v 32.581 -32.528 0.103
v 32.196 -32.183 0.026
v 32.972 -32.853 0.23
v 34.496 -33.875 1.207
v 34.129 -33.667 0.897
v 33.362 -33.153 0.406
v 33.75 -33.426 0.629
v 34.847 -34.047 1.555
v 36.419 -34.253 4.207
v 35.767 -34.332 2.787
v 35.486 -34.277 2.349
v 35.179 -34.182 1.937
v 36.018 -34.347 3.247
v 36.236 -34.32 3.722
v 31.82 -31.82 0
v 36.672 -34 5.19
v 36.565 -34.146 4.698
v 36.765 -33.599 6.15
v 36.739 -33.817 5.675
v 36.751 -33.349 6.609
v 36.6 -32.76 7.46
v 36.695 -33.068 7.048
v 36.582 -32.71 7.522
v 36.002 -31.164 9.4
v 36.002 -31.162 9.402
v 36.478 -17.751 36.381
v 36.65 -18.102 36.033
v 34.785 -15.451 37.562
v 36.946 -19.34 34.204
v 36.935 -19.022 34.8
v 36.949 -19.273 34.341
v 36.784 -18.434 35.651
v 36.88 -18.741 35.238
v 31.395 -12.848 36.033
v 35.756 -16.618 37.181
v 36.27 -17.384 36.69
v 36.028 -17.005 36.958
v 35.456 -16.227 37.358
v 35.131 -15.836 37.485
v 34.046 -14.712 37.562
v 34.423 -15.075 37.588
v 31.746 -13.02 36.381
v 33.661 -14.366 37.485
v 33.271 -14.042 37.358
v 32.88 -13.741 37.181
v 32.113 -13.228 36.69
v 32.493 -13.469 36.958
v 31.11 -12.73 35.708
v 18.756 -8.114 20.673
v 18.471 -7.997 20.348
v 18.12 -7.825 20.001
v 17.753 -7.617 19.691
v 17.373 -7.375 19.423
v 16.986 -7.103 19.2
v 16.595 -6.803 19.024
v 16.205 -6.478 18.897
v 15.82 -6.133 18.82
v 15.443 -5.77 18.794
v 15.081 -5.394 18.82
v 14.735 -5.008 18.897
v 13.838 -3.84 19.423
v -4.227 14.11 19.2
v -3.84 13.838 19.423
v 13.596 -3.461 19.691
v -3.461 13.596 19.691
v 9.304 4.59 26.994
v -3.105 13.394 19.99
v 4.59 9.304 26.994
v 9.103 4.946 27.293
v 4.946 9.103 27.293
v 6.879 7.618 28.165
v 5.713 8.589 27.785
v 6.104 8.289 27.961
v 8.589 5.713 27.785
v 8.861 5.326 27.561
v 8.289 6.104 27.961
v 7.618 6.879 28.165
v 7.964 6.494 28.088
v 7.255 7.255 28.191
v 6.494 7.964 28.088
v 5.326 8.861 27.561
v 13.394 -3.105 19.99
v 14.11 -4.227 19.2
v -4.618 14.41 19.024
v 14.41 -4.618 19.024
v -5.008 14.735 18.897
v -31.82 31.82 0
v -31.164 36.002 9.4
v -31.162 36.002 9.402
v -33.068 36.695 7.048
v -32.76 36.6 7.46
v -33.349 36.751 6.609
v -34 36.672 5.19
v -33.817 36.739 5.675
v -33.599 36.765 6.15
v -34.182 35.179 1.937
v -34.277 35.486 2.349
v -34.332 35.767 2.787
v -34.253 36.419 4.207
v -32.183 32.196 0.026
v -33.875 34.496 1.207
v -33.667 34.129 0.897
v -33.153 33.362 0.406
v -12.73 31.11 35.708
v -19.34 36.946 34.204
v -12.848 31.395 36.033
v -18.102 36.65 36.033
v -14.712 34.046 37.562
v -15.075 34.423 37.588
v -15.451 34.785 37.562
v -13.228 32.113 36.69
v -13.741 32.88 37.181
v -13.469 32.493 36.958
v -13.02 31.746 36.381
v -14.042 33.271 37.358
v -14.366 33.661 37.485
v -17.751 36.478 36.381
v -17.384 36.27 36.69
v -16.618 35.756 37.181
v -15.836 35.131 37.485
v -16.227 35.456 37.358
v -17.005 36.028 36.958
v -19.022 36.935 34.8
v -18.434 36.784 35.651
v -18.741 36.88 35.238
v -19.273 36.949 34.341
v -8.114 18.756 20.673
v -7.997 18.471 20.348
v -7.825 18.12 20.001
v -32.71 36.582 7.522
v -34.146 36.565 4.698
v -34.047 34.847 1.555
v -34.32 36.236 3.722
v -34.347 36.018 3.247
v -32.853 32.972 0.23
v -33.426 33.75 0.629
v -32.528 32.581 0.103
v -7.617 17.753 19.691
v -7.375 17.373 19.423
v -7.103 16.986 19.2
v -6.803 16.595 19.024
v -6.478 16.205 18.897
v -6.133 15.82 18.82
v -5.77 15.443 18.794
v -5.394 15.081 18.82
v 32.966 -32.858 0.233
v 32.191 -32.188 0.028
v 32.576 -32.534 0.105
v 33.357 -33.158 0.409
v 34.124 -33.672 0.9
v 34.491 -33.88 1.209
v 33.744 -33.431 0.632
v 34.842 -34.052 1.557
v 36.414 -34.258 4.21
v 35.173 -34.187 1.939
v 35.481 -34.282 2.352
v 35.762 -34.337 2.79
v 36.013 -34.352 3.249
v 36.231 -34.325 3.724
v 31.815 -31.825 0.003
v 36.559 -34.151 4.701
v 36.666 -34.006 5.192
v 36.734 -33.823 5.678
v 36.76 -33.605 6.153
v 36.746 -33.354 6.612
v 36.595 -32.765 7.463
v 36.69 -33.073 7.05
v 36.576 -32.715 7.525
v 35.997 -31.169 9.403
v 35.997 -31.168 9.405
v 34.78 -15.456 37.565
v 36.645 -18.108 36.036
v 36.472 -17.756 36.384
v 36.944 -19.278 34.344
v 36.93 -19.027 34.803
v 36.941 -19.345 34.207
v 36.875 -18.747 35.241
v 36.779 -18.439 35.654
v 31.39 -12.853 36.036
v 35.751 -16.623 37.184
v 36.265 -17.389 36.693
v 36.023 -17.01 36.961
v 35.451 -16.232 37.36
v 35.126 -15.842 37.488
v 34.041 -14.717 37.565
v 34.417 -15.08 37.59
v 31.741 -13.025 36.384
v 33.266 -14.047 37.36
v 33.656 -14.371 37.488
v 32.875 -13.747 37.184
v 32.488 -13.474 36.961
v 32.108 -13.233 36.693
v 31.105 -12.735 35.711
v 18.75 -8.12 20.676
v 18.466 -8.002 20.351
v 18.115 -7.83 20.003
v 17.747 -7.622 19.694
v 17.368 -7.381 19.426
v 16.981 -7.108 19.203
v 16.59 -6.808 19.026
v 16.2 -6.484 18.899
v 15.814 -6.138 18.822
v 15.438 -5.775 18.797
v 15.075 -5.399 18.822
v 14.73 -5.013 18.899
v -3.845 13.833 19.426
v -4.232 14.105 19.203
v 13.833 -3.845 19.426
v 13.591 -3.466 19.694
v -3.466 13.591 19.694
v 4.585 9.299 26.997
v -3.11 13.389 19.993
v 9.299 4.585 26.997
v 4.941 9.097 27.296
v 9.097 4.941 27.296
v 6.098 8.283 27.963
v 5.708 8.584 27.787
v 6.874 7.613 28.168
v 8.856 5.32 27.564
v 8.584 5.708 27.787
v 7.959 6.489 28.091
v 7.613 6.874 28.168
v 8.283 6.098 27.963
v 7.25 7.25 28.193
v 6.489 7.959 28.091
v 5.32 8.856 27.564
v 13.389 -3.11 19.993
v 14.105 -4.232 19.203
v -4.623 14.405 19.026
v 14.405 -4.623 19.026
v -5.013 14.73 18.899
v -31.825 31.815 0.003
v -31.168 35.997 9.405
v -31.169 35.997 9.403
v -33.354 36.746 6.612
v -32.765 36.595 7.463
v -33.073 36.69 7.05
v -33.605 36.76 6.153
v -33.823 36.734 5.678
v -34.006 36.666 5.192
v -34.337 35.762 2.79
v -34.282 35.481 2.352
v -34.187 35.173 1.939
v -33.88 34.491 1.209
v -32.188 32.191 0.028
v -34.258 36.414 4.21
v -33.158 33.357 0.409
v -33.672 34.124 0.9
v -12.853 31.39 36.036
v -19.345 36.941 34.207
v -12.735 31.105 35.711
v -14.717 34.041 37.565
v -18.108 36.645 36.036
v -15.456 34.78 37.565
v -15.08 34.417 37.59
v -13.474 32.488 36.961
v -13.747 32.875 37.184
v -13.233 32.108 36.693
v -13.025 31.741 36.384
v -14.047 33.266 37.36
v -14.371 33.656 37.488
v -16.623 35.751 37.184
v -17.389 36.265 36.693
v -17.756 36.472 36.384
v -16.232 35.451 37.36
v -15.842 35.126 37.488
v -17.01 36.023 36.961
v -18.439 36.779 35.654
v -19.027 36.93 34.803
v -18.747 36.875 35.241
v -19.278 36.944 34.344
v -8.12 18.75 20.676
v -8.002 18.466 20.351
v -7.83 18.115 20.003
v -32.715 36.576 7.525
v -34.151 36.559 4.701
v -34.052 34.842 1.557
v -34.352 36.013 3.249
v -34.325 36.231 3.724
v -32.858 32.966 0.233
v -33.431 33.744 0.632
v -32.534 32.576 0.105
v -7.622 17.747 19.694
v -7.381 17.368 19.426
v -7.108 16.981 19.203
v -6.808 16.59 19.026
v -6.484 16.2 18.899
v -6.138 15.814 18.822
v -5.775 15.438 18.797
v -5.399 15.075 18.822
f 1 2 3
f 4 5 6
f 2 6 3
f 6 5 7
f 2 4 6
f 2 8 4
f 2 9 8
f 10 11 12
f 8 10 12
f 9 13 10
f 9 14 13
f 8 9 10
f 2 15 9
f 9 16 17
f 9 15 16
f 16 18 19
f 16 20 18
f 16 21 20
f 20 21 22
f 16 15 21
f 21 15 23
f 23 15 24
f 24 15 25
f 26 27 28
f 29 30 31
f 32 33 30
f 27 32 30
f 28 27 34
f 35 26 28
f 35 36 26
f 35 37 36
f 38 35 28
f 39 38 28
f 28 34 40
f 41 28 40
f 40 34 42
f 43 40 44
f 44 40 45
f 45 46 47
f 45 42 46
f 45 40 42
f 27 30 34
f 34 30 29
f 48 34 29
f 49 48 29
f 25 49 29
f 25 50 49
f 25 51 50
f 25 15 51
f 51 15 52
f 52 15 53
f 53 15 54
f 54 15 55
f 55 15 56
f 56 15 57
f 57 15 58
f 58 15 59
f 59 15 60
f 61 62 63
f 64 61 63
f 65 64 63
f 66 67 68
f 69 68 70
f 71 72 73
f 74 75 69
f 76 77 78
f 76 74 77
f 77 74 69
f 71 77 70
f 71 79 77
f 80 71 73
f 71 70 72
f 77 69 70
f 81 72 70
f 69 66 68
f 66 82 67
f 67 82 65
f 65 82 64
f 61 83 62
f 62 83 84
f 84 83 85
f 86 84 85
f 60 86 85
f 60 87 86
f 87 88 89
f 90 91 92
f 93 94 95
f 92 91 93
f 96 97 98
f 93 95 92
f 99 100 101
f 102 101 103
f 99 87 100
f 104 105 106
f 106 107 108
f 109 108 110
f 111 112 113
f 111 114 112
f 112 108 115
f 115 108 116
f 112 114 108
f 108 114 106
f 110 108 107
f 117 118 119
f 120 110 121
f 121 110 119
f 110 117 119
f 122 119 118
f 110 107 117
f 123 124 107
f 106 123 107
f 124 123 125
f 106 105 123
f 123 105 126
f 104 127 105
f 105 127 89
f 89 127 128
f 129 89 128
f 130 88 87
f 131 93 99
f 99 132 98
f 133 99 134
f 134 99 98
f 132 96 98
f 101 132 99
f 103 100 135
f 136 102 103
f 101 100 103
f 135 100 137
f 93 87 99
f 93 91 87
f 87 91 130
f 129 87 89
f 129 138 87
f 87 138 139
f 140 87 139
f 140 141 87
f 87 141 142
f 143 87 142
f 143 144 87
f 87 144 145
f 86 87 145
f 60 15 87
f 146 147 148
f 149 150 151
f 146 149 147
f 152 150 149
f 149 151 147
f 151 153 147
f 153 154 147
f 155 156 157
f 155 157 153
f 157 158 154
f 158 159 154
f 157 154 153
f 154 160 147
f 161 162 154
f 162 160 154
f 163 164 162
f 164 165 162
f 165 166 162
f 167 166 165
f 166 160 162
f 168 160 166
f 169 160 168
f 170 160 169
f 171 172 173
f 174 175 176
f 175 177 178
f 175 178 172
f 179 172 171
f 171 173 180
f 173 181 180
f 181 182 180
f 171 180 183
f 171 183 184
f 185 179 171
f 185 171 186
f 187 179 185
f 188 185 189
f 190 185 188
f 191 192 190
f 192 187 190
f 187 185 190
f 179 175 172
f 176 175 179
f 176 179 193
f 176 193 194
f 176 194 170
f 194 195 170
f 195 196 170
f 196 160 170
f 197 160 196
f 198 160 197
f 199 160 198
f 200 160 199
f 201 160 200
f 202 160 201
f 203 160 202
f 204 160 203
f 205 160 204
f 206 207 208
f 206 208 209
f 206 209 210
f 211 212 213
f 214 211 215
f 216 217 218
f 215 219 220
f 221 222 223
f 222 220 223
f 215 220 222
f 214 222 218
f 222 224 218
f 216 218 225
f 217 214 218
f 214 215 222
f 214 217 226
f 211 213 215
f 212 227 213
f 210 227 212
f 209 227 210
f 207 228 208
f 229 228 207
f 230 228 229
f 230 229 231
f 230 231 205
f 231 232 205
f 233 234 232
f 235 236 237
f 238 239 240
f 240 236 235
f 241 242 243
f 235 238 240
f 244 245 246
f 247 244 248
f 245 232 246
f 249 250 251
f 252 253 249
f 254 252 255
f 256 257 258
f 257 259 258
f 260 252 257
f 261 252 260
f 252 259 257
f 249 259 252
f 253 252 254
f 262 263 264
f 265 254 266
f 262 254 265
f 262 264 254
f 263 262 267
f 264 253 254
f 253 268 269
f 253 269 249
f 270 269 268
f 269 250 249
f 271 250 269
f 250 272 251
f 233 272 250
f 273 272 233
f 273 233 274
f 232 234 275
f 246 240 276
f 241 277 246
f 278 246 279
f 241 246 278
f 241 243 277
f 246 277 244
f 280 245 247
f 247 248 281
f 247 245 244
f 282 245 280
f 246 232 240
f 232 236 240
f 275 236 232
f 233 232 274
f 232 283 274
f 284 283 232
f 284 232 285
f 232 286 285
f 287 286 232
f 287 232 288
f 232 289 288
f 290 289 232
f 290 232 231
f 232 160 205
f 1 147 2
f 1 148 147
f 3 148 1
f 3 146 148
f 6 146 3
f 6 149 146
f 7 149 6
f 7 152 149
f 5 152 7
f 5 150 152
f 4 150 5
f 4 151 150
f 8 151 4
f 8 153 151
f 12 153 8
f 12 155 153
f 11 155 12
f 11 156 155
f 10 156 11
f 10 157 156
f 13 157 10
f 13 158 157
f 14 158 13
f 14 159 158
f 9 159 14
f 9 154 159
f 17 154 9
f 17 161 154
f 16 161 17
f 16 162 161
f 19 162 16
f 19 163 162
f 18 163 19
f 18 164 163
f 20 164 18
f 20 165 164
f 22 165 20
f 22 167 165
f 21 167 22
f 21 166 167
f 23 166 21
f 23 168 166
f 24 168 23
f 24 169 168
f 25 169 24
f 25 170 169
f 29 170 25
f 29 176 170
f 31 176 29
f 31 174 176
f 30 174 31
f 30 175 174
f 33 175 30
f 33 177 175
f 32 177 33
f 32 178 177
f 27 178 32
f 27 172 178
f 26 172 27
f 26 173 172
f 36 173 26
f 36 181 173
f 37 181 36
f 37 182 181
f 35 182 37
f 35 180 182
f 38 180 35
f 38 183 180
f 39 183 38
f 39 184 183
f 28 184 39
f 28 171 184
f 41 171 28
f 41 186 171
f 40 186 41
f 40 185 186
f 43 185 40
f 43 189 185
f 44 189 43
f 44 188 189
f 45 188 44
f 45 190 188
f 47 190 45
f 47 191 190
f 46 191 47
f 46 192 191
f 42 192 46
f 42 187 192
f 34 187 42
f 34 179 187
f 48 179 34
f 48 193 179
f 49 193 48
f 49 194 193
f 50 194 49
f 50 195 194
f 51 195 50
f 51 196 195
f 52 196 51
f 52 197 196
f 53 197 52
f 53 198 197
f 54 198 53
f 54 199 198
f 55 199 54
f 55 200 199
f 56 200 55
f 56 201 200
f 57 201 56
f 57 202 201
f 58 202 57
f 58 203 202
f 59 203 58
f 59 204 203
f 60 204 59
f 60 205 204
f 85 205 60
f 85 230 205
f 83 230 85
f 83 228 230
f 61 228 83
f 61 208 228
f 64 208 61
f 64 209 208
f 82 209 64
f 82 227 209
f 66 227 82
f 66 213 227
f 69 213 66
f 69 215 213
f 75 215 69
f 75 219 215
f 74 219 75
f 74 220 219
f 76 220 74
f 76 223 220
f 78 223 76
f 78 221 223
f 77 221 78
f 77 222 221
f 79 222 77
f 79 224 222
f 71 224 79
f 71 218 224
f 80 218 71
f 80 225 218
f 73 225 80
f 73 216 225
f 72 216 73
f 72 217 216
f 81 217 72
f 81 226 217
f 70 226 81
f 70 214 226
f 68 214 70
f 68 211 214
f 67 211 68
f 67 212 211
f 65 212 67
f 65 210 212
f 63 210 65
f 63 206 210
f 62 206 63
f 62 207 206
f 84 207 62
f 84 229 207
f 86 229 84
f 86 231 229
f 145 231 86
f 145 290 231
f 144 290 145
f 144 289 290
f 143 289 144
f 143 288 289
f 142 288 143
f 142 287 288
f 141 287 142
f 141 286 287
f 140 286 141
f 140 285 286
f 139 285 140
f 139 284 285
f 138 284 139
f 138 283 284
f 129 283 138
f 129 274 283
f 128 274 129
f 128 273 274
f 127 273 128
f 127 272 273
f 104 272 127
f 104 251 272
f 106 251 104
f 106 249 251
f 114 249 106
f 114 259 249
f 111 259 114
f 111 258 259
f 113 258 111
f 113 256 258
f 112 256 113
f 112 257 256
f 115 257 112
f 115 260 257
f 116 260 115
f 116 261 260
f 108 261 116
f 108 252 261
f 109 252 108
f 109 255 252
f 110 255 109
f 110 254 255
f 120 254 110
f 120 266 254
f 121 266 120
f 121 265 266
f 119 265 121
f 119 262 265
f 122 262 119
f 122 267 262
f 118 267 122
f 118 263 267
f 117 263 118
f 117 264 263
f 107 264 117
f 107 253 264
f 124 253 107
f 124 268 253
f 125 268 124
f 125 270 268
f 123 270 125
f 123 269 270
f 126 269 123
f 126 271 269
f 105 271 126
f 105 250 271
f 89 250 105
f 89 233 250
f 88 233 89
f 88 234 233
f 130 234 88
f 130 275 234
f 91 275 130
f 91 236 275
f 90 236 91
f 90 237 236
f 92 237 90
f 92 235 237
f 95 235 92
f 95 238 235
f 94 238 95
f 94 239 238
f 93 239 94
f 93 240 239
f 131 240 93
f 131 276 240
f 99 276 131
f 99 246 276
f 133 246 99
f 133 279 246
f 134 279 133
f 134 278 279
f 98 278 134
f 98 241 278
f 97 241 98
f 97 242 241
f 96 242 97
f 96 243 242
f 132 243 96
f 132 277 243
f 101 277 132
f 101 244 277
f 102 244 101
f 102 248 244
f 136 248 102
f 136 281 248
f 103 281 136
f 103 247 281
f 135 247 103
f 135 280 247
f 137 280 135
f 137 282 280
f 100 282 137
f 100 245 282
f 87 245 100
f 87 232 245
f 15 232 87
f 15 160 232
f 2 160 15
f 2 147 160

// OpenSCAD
// file: ../utils/core/clip.scad
//
// NopSCADlib Copyright Chris Palmer 2018
// nop.head@gmail.com
// hydraraptor.blogspot.com
//
// This file is part of NopSCADlib.
//
// NopSCADlib is free software: you can redistribute it and/or modify it under the terms of the
// GNU General Public License as published by the Free Software Foundation, either version 3 of
// the License, or (at your option) any later version.
//
// NopSCADlib is distributed in the hope that it will be useful, but WITHOUT ANY WARRANTY;
// without even the implied warranty of MERCHANTABILITY or FITNESS FOR A PARTICULAR PURPOSE.
// See the GNU General Public License for more details.
//
// You should have received a copy of the GNU General Public License along with NopSCADlib.
// If not, see <https://www.gnu.org/licenses/>.
//

//
//! Construct arbirarily large box to partition 3D space and clip objects, useful for creating cross sections to see the inside when debugging.
//!
//! Original version by Doug Moen on the OpenSCAD forum
//
//
module box(xmin, ymin, zmin, xmax, ymax, zmax) //! Construct a box given its bounds
    polyhedron(
        [[xmin, ymin, zmin],  // 0
         [xmin, ymin, zmax],  // 1
         [xmin, ymax, zmin],  // 2
         [xmin, ymax, zmax],  // 3
         [xmax, ymin, zmin],  // 4
         [xmax, ymin, zmax],  // 5
         [xmax, ymax, zmin],  // 6
         [xmax, ymax, zmax]], // 7
        [[7,5,1,3],  // top
         [2,0,4,6],  // bottom
         [5,4,0,1],  // front
         [3,2,6,7],  // back
         [5,7,6,4],  // right
         [0,2,3,1]]  // left
    );

module clip(xmin = -inf, ymin = -inf, zmin = -inf, xmax = inf, ymax = inf, zmax = inf) //! Clip child to specified boundaries
    render() intersection() {
        children();

        box(xmin, ymin, zmin, xmax, ymax, zmax);
    }
// file: ../utils/core/rounded_rectangle.scad
//
// NopSCADlib Copyright Chris Palmer 2018
// nop.head@gmail.com
// hydraraptor.blogspot.com
//
// This file is part of NopSCADlib.
//
// NopSCADlib is free software: you can redistribute it and/or modify it under the terms of the
// GNU General Public License as published by the Free Software Foundation, either version 3 of
// the License, or (at your option) any later version.
//
// NopSCADlib is distributed in the hope that it will be useful, but WITHOUT ANY WARRANTY;
// without even the implied warranty of MERCHANTABILITY or FITNESS FOR A PARTICULAR PURPOSE.
// See the GNU General Public License for more details.
//
// You should have received a copy of the GNU General Public License along with NopSCADlib.
// If not, see <https://www.gnu.org/licenses/>.
//

//
//! Rectangle with rounded corners.
//
module rounded_square(size, r, center = true) //! Like ```square()``` but with with rounded corners
{
    $fn = r2sides4n(r);
    offset(r) offset(-r) square(size, center = center);
}

module rounded_rectangle(size, r, center = true, xy_center = true) //! Like ```cube()``` but corners rounded in XY plane and separate centre options for xy and z.
{
    linear_extrude(height = size[2], center = center)
        rounded_square([size[0], size[1]], r, xy_center);
}
// file: ../utils/core/teardrops.scad
//
// NopSCADlib Copyright Chris Palmer 2018
// nop.head@gmail.com
// hydraraptor.blogspot.com
//
// This file is part of NopSCADlib.
//
// NopSCADlib is free software: you can redistribute it and/or modify it under the terms of the
// GNU General Public License as published by the Free Software Foundation, either version 3 of
// the License, or (at your option) any later version.
//
// NopSCADlib is distributed in the hope that it will be useful, but WITHOUT ANY WARRANTY;
// without even the implied warranty of MERCHANTABILITY or FITNESS FOR A PARTICULAR PURPOSE.
// See the GNU General Public License for more details.
//
// You should have received a copy of the GNU General Public License along with NopSCADlib.
// If not, see <https://www.gnu.org/licenses/>.
//

//
//! For making horizontal holes that don't need support material.
//! Small holes can get away without it, but they print better with truncated teardrops.
//
module teardrop(h, r, center = true, truncate = true) //! For making horizontal holes that don't need support material, set ```truncate = false``` to make traditional RepRap teardrops that don't even need bridging
    render(convexity = 5)
        extrude_if(h, center)
           hull() {
                circle4n(r);

                if(truncate)
                    translate([0, r / 2])
                        square([2 * r * (sqrt(2) - 1), r], center = true);
                else
                    polygon([[0, 0], [eps, 0], [0, r * sqrt(2)]]);
            }

module teardrop_plus(h, r, center = true, truncate = true) //! Slightly bigger teardrop to allow for the 3D printing staircase effect
    teardrop(h, r + layer_height / 4, center, truncate);

module tearslot(h, r, w, center = true) //! A horizontal slot that doesn't need support material
    extrude_if(h, center)
        hull() {
            translate([-w/2,0,0]) teardrop(r = r, h = 0);
            translate([ w/2,0,0]) teardrop(r = r, h = 0);
        }

module vertical_tearslot(h, r, l, center = true) //! A vertical slot that doesn't need support material
    extrude_if(h, center)
        hull() {
            translate([0,  l / 2]) teardrop(0, r, true);
            translate([0, -l / 2])
                circle4n(r);
        }
// file: ../utils/core/polyholes.scad
//
// NopSCADlib Copyright Chris Palmer 2018
// nop.head@gmail.com
// hydraraptor.blogspot.com
//
// This file is part of NopSCADlib.
//
// NopSCADlib is free software: you can redistribute it and/or modify it under the terms of the
// GNU General Public License as published by the Free Software Foundation, either version 3 of
// the License, or (at your option) any later version.
//
// NopSCADlib is distributed in the hope that it will be useful, but WITHOUT ANY WARRANTY;
// without even the implied warranty of MERCHANTABILITY or FITNESS FOR A PARTICULAR PURPOSE.
// See the GNU General Public License for more details.
//
// You should have received a copy of the GNU General Public License along with NopSCADlib.
// If not, see <https://www.gnu.org/licenses/>.
//

//
//! A method of making 3D printed holes come out the right size regardless of the printer, providing
//! it gets the linear dimensions right. See <https://hydraraptor.blogspot.com/2011/02/polyholes.html>
//!
//! The module provides `poly_circle()`, `poly_cylinder()` and `poly_ring()` that is useful for making printed washers and pillars.
//
function sides(r) = max(round(4 * r), 3); //! Optimium number of sides for specified radius
function corrected_radius(r, n = 0)   = r / cos(180 / (n ? n : sides(r))); //! Adjusted radius to make flats lie on the circle
function corrected_diameter(d, n = 0) = d / cos(180 / (n ? n : sides(d / 2))); //! Adjusted diameter to make flats lie on the circle

module poly_circle(r, sides = 0) { //! Make a circle adjusted to print the correct size
    n = sides ? sides : sides(r);
    circle(r = corrected_radius(r,n), $fn = n);
}

module poly_cylinder(r, h, center = false, sides = 0) //! Make a cylinder adjusted to print the correct size
    extrude_if(h, center)
        poly_circle(r, sides);

module poly_ring(or, ir) { //! Make a 2D ring adjusted to have the correct internal radius
    cir = corrected_radius(ir);
    filaments = floor((or - cir) / extrusion_width);
    if(filaments > 3)
        difference() {
            circle(or);

            poly_circle(ir);
        }
    else
        if(filaments >= 2)
            difference() {
                offset(or - cir)
                    poly_circle(ir);

                poly_circle(ir);
            }
            else
                difference() {
                    poly_circle(or);

                    offset(-squeezed_wall)
                        poly_circle(or);
                }
}

module drill(r, h = 100) //! Make a cylinder for drilling holes suitable for CNC routing, set h = 0 for circle
    extrude_if(h)
        circle(r = corrected_radius(r, r2sides(r)));
//
// Horizontal slot
//
module slot(r, l, h = 100) //! Make a horizontal slot suitable for CNC routing, set h = 0 for 2D version
    extrude_if(h)
        hull() {
            translate([l / 2,0])
                drill(r, 0);

            translate([-l / 2,0])
                drill(r, 0);
        }
// file: ../utils/core/bom.scad
//
// NopSCADlib Copyright Chris Palmer 2018
// nop.head@gmail.com
// hydraraptor.blogspot.com
//
// This file is part of NopSCADlib.
//
// NopSCADlib is free software: you can redistribute it and/or modify it under the terms of the
// GNU General Public License as published by the Free Software Foundation, either version 3 of
// the License, or (at your option) any later version.
//
// NopSCADlib is distributed in the hope that it will be useful, but WITHOUT ANY WARRANTY;
// without even the implied warranty of MERCHANTABILITY or FITNESS FOR A PARTICULAR PURPOSE.
// See the GNU General Public License for more details.
//
// You should have received a copy of the GNU General Public License along with NopSCADlib.
// If not, see <https://www.gnu.org/licenses/>.
//

//
//! Bill Of Materials generation via echo and the ```bom.py``` script. Also handles exploded assembly views and posing. Assembly instructions can precede the module
//! definition that makes the assembly.
//!
//! The example below shows how to define a vitamin and incorporate it into an assembly with sub-assemblies and make an exploded view. The resulting flat BOM is shown but
//! heirachical BOMs are also generated for real projects.
//
function bom_mode(n = 1) = $_bom >= n && (is_undef($on_bom) || $on_bom);  //! Current BOM mode, 0 = none, 1 = printed and routed parts and assemblies, 2 includes vitamins as well
function exploded() = is_undef($exploded_parent) ? $exploded : 0;   //! Returns the value of ```$exploded``` if it is defined, else ```0```
function show_supports() = !$preview || exploded();                 //! True if printed support material should be shown

module no_explode() let($exploded_parent = true) children();        //! Prevent children being exploded
module no_pose() let($posed = true) children();                     //! Force children not to be posed even if parent is

module explode(d, explode_children = false, offset = [0,0,0]) {     //! Explode children by specified Z distance or vector ```d```, option to explode grand children
    v = is_list(d) ? d : [0, 0, d];
    o = is_list(offset) ? offset : [0, 0, offset];
    if($exploded && is_undef($exploded_parent)) {
        translate(o)                                                // Draw the line first in case the child is transparent
            hull() {
                sphere(0.2);

                translate(v * $exploded)
                    sphere(0.2);
            }

        translate(v * $exploded)
            let($exploded_parent = explode_children ? undef : true)
                children();
    }
    else
        children();
}

module pose(a = [55, 0, 25], t = [0, 0, 0], exploded = undef)       //! Pose an STL or assembly for rendering to png by specifying rotation ```a``` and translation ```t```, ```exploded = true for``` just the exploded view or ```false``` for unexploded only.
    if(is_undef($pose) || !is_undef($posed) || (!is_undef(exploded) && exploded != !!exploded()))
        children();
    else
        let($posed = true) // only pose the top level
            rotate([55, 0, 25])
                rotate([-a.x, 0, 0])
                    rotate([0, -a.y, 0])
                        rotate([0, 0, -a.z])
                            translate(-t)
                                children();


module assembly(name) {                 //! Name an assembly that will appear on the BOM, there needs to a module named ```<name>_assembly``` to make it
    if(bom_mode())
        echo(str("~", name, "_assembly{"));

    no_pose()
        if(is_undef($child_assembly))
            let($child_assembly = true)
                children();
        else
            no_explode()
                children();

    if(bom_mode())
        echo(str("~}", name, "_assembly"));
}

module stl(name) {                      //! Name an stl that will appear on the BOM, there needs to a module named ```<name>_stl``` to make it
    if(bom_mode())
        echo(str("~", name, ".stl"));
}

module dxf(name) {                      //! Name a dxf that will appear on the BOM, there needs to a module named ```<name>_dxf``` to make it
    if(bom_mode())
        echo(str("~", name, ".dxf"));
}

function value_string(value) = is_string(value) ? str("\"", value, "\"") : str(value); //! Convert ```value``` to a string or quote it if it is already a string

function arg(value, default, name = "") =   //! Create string for arg if not default, helper for ```vitamin()```
    value == default ? ""
                     : name ? str(", ", name, " = ", value_string(value))
                            : str(", ", value_string(value));

module vitamin(description) {                //! Describe a vitamin for the BOM entry and precede it with a module call that creates it, eg. "wigit(42): Type 42 widget"
    if(bom_mode(2))
        echo(str("~", description, !is_undef($hidden) ? " - not shown" : ""));
}

module not_on_bom(on = false)               //! Specify the following child parts are not on the BOM, for example when they are on a PCB that comes assembled
    let($on_bom = on)
        children();

module hidden()                             //! Make item invisible, except on the BOM
    scale(1 / sqr(1024))
        let($hidden = true)
            children();
// file: ../utils/core/sphere.scad
//
// NopSCADlib Copyright Chris Palmer 2018
// nop.head@gmail.com
// hydraraptor.blogspot.com
//
// This file is part of NopSCADlib.
//
// NopSCADlib is free software: you can redistribute it and/or modify it under the terms of the
// GNU General Public License as published by the Free Software Foundation, either version 3 of
// the License, or (at your option) any later version.
//
// NopSCADlib is distributed in the hope that it will be useful, but WITHOUT ANY WARRANTY;
// without even the implied warranty of MERCHANTABILITY or FITNESS FOR A PARTICULAR PURPOSE.
// See the GNU General Public License for more details.
//
// You should have received a copy of the GNU General Public License along with NopSCADlib.
// If not, see <https://www.gnu.org/licenses/>.
//

//! Redefines `sphere()` to always have a vertex on all six half axes I.e. vertices at the poles and the equator and `$fn` a multiple of four.
//! This ensures `hull` and `minkowski` results have the correct dimensions when spheres are placed at the corners.

module sphere(r = 1, d = undef) {                   //! Override ```sphere``` so that has vertices on all three axes. Has the advantage of giving correct dimensions when hulled
    R = is_undef(d) ? r : d / 2;
    rotate_extrude($fn = r2sides4n(R))
        rotate(-90)
            semi_circle(R);
}
// file: ../utils/core/global.scad
//
// NopSCADlib Copyright Chris Palmer 2018
// nop.head@gmail.com
// hydraraptor.blogspot.com
//
// This file is part of NopSCADlib.
//
// NopSCADlib is free software: you can redistribute it and/or modify it under the terms of the
// GNU General Public License as published by the Free Software Foundation, either version 3 of
// the License, or (at your option) any later version.
//
// NopSCADlib is distributed in the hope that it will be useful, but WITHOUT ANY WARRANTY;
// without even the implied warranty of MERCHANTABILITY or FITNESS FOR A PARTICULAR PURPOSE.
// See the GNU General Public License for more details.
//
// You should have received a copy of the GNU General Public License along with NopSCADlib.
// If not, see <https://www.gnu.org/licenses/>.
//

//
//! Global constants, functions and modules. This file is used directly or indirectly in every scad file.
//
include <../../global_defs.scad>

function sqr(x) = x * x;                                                            //! Returns the square of ```x```
function inch(x) = x * 25.4;                                                        //! Inch to mm conversion
function echoit(x) = echo(x) x;                                                     //! Echo expression and return it, useful for debugging
function in(list, x) = !!len([for(v = list) if(v == x) true]);                      //! Returns true if ```x``` is an element in the ```list```
function Len(x) = is_list(x) ? len(x) : 0;                                          //! Returns the length of a list or 0 if ```x``` is not a list
function r2sides(r) = $fn ? $fn : ceil(max(min(360/ $fa, r * 2 * PI / $fs), 5));    //! Replicates the OpenSCAD logic to calculate the number of sides from the radius
function r2sides4n(r) = floor((r2sides(r) + 3) / 4) * 4;                            //! Round up the number of sides to a multiple of 4 to ensure points land on all axes

module translate_z(z) translate([0, 0, z]) children();                              //! Shortcut for Z only translations
module vflip() rotate([180, 0, 0]) children();                                      //! Invert children by doing a 180 flip around the X axis
module ellipse(xr, yr) scale([1, yr / xr]) circle4n(xr);                            //! Draw an ellipse

module extrude_if(h, center = true)                 //! Extrudes 2D object to 3D when ```h``` is nonzero, otherwise leaves it 2D
    if(h)
        linear_extrude(height = h, center = center) // 3D
            children();
    else
        children();                                 // 2D

module circle4n(r, d = undef) {                     //! Circle with multiple of 4 vertices
    R = is_undef(d) ? r : d / 2;
    circle(R, $fn = r2sides4n(R));
}

module semi_circle(r, d = undef)                    //! A semi circle in the positive Y domain
    intersection() {
        R = is_undef(d) ? r : d / 2;
        circle4n(R);

        sq = R + 1;
        translate([-sq, 0])
            square([2 * sq, sq]);
    }

include <sphere.scad>
include <bom.scad>
include <polyholes.scad>
include <teardrops.scad>
include <rounded_rectangle.scad>
include <clip.scad>
// file: ../core.scad
//
// NopSCADlib Copyright Chris Palmer 2018
// nop.head@gmail.com
// hydraraptor.blogspot.com
//
// This file is part of NopSCADlib.
//
// NopSCADlib is free software: you can redistribute it and/or modify it under the terms of the
// GNU General Public License as published by the Free Software Foundation, either version 3 of
// the License, or (at your option) any later version.
//
// NopSCADlib is distributed in the hope that it will be useful, but WITHOUT ANY WARRANTY;
// without even the implied warranty of MERCHANTABILITY or FITNESS FOR A PARTICULAR PURPOSE.
// See the GNU General Public License for more details.
//
// You should have received a copy of the GNU General Public License along with NopSCADlib.
// If not, see <https://www.gnu.org/licenses/>.
//

//
// Include this file to use the library
//
include <global_defs.scad>
//
// Global functions and modules
//
use <utils/core/global.scad>
// file: ../utils/annotation.scad
//
// NopSCADlib Copyright Chris Palmer 2018
// nop.head@gmail.com
// hydraraptor.blogspot.com
//
// This file is part of NopSCADlib.
//
// NopSCADlib is free software: you can redistribute it and/or modify it under the terms of the
// GNU General Public License as published by the Free Software Foundation, either version 3 of
// the License, or (at your option) any later version.
//
// NopSCADlib is distributed in the hope that it will be useful, but WITHOUT ANY WARRANTY;
// without even the implied warranty of MERCHANTABILITY or FITNESS FOR A PARTICULAR PURPOSE.
// See the GNU General Public License for more details.
//
// You should have received a copy of the GNU General Public License along with NopSCADlib.
// If not, see <https://www.gnu.org/licenses/>.
//
include <../core.scad>
//
//! Annotation used in this documentation

module label(str, scale = 0.25, valign = "baseline", halign = "left") //! Draw text that always faces the camera
    color("black")
        %rotate($vpr != [0, 0, 0] ? $vpr : [70, 0, 315])
            linear_extrude(height = eps)
                scale(scale)
                    text(str, valign = valign, halign = halign);

module arrow(length = 20) { //! Draw an arrow that faces downwards
    d = length / 20;
    head_r = 1.5 * d;

    color("grey") %union() {
        translate_z(head_r)
            cylinder(d = d, h = length - head_r, $fn = 32);

        cylinder(r1 = 0, r2 = head_r, h = head_r);
    }
}
// file: ../utils/rounded_polygon.scad
//
// NopSCADlib Copyright Chris Palmer 2018
// nop.head@gmail.com
// hydraraptor.blogspot.com
//
// This file is part of NopSCADlib.
//
// NopSCADlib is free software: you can redistribute it and/or modify it under the terms of the
// GNU General Public License as published by the Free Software Foundation, either version 3 of
// the License, or (at your option) any later version.
//
// NopSCADlib is distributed in the hope that it will be useful, but WITHOUT ANY WARRANTY;
// without even the implied warranty of MERCHANTABILITY or FITNESS FOR A PARTICULAR PURPOSE.
// See the GNU General Public License for more details.
//
// You should have received a copy of the GNU General Public License along with NopSCADlib.
// If not, see <https://www.gnu.org/licenses/>.
//

//
//! Draw a polygon with rounded corners. Each element of the vector is the XY coordinate and a radius. Radius can be negative for a concave corner.
//!
//! Because the tangents need to be calculated to find the length these can be calculated separately and re-used when drawing to save calculating them twice.
//
include <../core.scad>

function circle_tangent(p1, p2) =
    let(
        r1 = p1[2],
        r2 = p2[2],
        dx = p2.x - p1.x,
        dy = p2.y - p1.y,
        d = sqrt(dx * dx + dy * dy),
        theta = atan2(dy, dx) + acos((r1 - r2) / d),
        xa = p1.x +(cos(theta) * r1),
        ya = p1.y +(sin(theta) * r1),
        xb = p2.x +(cos(theta) * r2),
        yb = p2.y +(sin(theta) * r2)
    )[ [xa, ya], [xb, yb] ];

function rounded_polygon_tangents(points) = //! Compute the straight sections needed to draw and to compute the lengths
    let(len = len(points))
        [for(i = [0 : len - 1])
            let(ends = circle_tangent(points[i], points[(i + 1) % len]))
                for(end = [0, 1])
                    ends[end]];

function sumv(v, i = 0, sum = 0) = i == len(v) ? sum : sumv(v, i + 1, sum + v[i]);

// the cross product of 2D vectors is the area of the parallelogram between them. We use the sign of this to decide if the angle is bigger than 180.
function rounded_polygon_length(points, tangents) = //! Calculate the length given the point list and the list of tangents computed by ``` rounded_polygon_tangents```
    let(
      len = len(points),
      indices = [0 : len - 1],
      straights = [for(i = indices) norm(tangents[2 * i] - tangents[2 * i + 1])],
      arcs = [for(i = indices) let(p1 = tangents[2 * i + 1],
                                   p2 = tangents[(2 * i + 2) % (2 * len)],
                                   corner = points[(i + 1) % len],
                                   c = [corner.x, corner.y],
                                   v1 = p1 - c,
                                   v2 = p2 - c,
                                   r = abs(corner.z),
                                   a = acos((v1 * v2) / sqr(r))) PI * (cross(v1,v2) <= 0 ? a : 360 - a) * r / 180]
     )
    sumv(concat(straights, arcs));

module rounded_polygon(points, _tangents = undef) { //! Draw the rounded polygon from the point list, can pass the tangent list to save it being calculated
    len = len(points);
    indices = [0 : len - 1];
    tangents = _tangents ? _tangents : rounded_polygon_tangents(points);

    difference(convexity = points) {
        union() {
            for(i = indices)
                if(points[i][2] > 0)
                    hull() {
                        translate([points[i].x, points[i].y])
                            circle(points[i][2]);
                        polygon([tangents[(2 * i - 1 + 2 * len) % (2 * len)], tangents[2 * i], [points[i].x, points[i].y]]);
                    }

            polygon(tangents, convexity = points);
        }
        for(i = indices)
            if(points[i][2] < 0)
                hull() {
                    translate([points[i].x, points[i].y])
                        circle(-points[i][2]);

                    polygon([tangents[(2 * i - 1 + 2 * len) % (2 *len)], tangents[2 * i], [points[i].x, points[i].y]]);
                }
     }
}
// file: ../global_defs.scad
//
// NopSCADlib Copyright Chris Palmer 2018
// nop.head@gmail.com
// hydraraptor.blogspot.com
//
// This file is part of NopSCADlib.
//
// NopSCADlib is free software: you can redistribute it and/or modify it under the terms of the
// GNU General Public License as published by the Free Software Foundation, either version 3 of
// the License, or (at your option) any later version.
//
// NopSCADlib is distributed in the hope that it will be useful, but WITHOUT ANY WARRANTY;
// without even the implied warranty of MERCHANTABILITY or FITNESS FOR A PARTICULAR PURPOSE.
// See the GNU General Public License for more details.
//
// You should have received a copy of the GNU General Public License along with NopSCADlib.
// If not, see <https://www.gnu.org/licenses/>.
//

//
// This file included directly or indirectly in every scad file.
//
// This scheme allows the following:
//  bom defaults to 0
//  Setting $bom on the command line or in the main file before including lib.scad overrides it everywhere.
//  Setting $bom after including lib overrides bom in the libs but not in the local file.
//  Setting $_bom in the local file overrides it in the local file but not in the libs.
//
//function is_undef(x) = x == undef;

$_bom           = is_undef($bom)             ? 0      : $bom;             // 0 no bom, 1 assemblies and stls, 2 vitamins as well
$exploded       = is_undef($explode)         ? 0      : $explode;         // 1 for exploded view
layer_height    = is_undef($layer_height)    ? 0.25   : $layer_height;    // layer heigth when printing
extrusion_width = is_undef($extrusion_width) ? 0.5    : $extrusion_width; // filament width when printing
nozzle          = is_undef($nozzle)          ? 0.45   : $nozzle;          // 3D printer nozzle
cnc_bit_r       = is_undef($cnc_bit_r)       ? 1.2    : $cnc_bit_r;       // miniumum tool radius when milling 2D objects
pp1_colour      = is_undef($pp1_colour)      ? "lime" : $pp1_colour;      // printed part colour 1
pp2_colour      = is_undef($pp2_colour)      ? "red"  : $pp2_colour;      // printed part colour 2
pp3_colour      = is_undef($pp3_colour)      ? "blue" : $pp3_colour;      // printed part colour 3
pp4_colour      = is_undef($pp4_colour)      ? "darkorange" : $pp4_colour;// printed part colour 4
show_rays       = is_undef($show_rays)       ? false  : $show_rays;       // show camera sight lines and light direction

// Minimum wall is about two filaments wide but we extrude it closer to get better bonding
squeezed_wall = $preview ? 2 * extrusion_width - layer_height * (1 - PI / 4)
                         : extrusion_width - layer_height / 2 + nozzle / 2 + extrusion_width / 2;

inf = 1e10;      // very big
eps = 1/128;     // small fudge factor to stop CSG barfing on coincident faces.
$fa = 6;
$fs = extrusion_width / 2;

function round_to_layer(z) = ceil(z / layer_height) * layer_height;
// Some additional named colors
grey20                          = [0.2, 0.2, 0.2];
grey30                          = [0.3, 0.3, 0.3];
grey40                          = [0.4, 0.4, 0.4];
grey50                          = [0.5, 0.5, 0.5];
grey60                          = [0.6, 0.6, 0.6];
grey70                          = [0.7, 0.7, 0.7];
grey80                          = [0.8, 0.8, 0.8];
grey90                          = [0.9, 0.9, 0.9];
brass                           = "gold";

/*
 * Enums
 */
//
// Screws
//
hs_cap    = 0;
hs_pan    = 1;
hs_cs     = 2;     // counter sunk
hs_hex    = 3;
hs_grub   = 4;     // pulley set screw
hs_cs_cap = 5;
hs_dome   = 6;
//
// Hot end descriptions
//
jhead   = 1;
e3d     = 2;
//
// Face enumeration
//
f_bottom = 0;
f_top    = 1;
f_left   = 2;
f_right  = 3;
f_front  = 4;
f_back   = 5;
// main file
//
// NopSCADlib Copyright Chris Palmer 2018
// nop.head@gmail.com
// hydraraptor.blogspot.com
//
// This file is part of NopSCADlib.
//
// NopSCADlib is free software: you can redistribute it and/or modify it under the terms of the
// GNU General Public License as published by the Free Software Foundation, either version 3 of
// the License, or (at your option) any later version.
//
// NopSCADlib is distributed in the hope that it will be useful, but WITHOUT ANY WARRANTY;
// without even the implied warranty of MERCHANTABILITY or FITNESS FOR A PARTICULAR PURPOSE.
// See the GNU General Public License for more details.
//
// You should have received a copy of the GNU General Public License along with NopSCADlib.
// If not, see <https://www.gnu.org/licenses/>.
//

include <../global_defs.scad>
use <../utils/rounded_polygon.scad>
use <../utils/annotation.scad>

r = 5;
h = 40;
h2 = 20;
h3 = 30;
w = 100;
w2 = 70;
w3 = 30;

profile = [
    [ -w / 2 + r, r,  r],
    [ -w / 2 + r / 2, 2 * r + eps, -eps],
    [-w2 / 2, h - r,  r],
    [-w3 / 2, h2 + r,-r],
    [      0, h3 - r, r],
    [ w3 / 2, h2 + r,-r],
    [ w2 / 2, h - r,  r],
    [  w / 2 - r / 2, 2 * r + eps, -eps],
    [  w / 2 - r, r,  r],
];

module rounded_polygons() {
    tangents = rounded_polygon_tangents(profile);
    length = rounded_polygon_length(profile, tangents);

    rotate([70, 0, 315])
        linear_extrude(height = eps)
            rounded_polygon(profile, tangents);

    translate([0, -10])
        label(str("perimeter length = ", length), valign = "top", halign = "right");

}

rounded_polygons();
